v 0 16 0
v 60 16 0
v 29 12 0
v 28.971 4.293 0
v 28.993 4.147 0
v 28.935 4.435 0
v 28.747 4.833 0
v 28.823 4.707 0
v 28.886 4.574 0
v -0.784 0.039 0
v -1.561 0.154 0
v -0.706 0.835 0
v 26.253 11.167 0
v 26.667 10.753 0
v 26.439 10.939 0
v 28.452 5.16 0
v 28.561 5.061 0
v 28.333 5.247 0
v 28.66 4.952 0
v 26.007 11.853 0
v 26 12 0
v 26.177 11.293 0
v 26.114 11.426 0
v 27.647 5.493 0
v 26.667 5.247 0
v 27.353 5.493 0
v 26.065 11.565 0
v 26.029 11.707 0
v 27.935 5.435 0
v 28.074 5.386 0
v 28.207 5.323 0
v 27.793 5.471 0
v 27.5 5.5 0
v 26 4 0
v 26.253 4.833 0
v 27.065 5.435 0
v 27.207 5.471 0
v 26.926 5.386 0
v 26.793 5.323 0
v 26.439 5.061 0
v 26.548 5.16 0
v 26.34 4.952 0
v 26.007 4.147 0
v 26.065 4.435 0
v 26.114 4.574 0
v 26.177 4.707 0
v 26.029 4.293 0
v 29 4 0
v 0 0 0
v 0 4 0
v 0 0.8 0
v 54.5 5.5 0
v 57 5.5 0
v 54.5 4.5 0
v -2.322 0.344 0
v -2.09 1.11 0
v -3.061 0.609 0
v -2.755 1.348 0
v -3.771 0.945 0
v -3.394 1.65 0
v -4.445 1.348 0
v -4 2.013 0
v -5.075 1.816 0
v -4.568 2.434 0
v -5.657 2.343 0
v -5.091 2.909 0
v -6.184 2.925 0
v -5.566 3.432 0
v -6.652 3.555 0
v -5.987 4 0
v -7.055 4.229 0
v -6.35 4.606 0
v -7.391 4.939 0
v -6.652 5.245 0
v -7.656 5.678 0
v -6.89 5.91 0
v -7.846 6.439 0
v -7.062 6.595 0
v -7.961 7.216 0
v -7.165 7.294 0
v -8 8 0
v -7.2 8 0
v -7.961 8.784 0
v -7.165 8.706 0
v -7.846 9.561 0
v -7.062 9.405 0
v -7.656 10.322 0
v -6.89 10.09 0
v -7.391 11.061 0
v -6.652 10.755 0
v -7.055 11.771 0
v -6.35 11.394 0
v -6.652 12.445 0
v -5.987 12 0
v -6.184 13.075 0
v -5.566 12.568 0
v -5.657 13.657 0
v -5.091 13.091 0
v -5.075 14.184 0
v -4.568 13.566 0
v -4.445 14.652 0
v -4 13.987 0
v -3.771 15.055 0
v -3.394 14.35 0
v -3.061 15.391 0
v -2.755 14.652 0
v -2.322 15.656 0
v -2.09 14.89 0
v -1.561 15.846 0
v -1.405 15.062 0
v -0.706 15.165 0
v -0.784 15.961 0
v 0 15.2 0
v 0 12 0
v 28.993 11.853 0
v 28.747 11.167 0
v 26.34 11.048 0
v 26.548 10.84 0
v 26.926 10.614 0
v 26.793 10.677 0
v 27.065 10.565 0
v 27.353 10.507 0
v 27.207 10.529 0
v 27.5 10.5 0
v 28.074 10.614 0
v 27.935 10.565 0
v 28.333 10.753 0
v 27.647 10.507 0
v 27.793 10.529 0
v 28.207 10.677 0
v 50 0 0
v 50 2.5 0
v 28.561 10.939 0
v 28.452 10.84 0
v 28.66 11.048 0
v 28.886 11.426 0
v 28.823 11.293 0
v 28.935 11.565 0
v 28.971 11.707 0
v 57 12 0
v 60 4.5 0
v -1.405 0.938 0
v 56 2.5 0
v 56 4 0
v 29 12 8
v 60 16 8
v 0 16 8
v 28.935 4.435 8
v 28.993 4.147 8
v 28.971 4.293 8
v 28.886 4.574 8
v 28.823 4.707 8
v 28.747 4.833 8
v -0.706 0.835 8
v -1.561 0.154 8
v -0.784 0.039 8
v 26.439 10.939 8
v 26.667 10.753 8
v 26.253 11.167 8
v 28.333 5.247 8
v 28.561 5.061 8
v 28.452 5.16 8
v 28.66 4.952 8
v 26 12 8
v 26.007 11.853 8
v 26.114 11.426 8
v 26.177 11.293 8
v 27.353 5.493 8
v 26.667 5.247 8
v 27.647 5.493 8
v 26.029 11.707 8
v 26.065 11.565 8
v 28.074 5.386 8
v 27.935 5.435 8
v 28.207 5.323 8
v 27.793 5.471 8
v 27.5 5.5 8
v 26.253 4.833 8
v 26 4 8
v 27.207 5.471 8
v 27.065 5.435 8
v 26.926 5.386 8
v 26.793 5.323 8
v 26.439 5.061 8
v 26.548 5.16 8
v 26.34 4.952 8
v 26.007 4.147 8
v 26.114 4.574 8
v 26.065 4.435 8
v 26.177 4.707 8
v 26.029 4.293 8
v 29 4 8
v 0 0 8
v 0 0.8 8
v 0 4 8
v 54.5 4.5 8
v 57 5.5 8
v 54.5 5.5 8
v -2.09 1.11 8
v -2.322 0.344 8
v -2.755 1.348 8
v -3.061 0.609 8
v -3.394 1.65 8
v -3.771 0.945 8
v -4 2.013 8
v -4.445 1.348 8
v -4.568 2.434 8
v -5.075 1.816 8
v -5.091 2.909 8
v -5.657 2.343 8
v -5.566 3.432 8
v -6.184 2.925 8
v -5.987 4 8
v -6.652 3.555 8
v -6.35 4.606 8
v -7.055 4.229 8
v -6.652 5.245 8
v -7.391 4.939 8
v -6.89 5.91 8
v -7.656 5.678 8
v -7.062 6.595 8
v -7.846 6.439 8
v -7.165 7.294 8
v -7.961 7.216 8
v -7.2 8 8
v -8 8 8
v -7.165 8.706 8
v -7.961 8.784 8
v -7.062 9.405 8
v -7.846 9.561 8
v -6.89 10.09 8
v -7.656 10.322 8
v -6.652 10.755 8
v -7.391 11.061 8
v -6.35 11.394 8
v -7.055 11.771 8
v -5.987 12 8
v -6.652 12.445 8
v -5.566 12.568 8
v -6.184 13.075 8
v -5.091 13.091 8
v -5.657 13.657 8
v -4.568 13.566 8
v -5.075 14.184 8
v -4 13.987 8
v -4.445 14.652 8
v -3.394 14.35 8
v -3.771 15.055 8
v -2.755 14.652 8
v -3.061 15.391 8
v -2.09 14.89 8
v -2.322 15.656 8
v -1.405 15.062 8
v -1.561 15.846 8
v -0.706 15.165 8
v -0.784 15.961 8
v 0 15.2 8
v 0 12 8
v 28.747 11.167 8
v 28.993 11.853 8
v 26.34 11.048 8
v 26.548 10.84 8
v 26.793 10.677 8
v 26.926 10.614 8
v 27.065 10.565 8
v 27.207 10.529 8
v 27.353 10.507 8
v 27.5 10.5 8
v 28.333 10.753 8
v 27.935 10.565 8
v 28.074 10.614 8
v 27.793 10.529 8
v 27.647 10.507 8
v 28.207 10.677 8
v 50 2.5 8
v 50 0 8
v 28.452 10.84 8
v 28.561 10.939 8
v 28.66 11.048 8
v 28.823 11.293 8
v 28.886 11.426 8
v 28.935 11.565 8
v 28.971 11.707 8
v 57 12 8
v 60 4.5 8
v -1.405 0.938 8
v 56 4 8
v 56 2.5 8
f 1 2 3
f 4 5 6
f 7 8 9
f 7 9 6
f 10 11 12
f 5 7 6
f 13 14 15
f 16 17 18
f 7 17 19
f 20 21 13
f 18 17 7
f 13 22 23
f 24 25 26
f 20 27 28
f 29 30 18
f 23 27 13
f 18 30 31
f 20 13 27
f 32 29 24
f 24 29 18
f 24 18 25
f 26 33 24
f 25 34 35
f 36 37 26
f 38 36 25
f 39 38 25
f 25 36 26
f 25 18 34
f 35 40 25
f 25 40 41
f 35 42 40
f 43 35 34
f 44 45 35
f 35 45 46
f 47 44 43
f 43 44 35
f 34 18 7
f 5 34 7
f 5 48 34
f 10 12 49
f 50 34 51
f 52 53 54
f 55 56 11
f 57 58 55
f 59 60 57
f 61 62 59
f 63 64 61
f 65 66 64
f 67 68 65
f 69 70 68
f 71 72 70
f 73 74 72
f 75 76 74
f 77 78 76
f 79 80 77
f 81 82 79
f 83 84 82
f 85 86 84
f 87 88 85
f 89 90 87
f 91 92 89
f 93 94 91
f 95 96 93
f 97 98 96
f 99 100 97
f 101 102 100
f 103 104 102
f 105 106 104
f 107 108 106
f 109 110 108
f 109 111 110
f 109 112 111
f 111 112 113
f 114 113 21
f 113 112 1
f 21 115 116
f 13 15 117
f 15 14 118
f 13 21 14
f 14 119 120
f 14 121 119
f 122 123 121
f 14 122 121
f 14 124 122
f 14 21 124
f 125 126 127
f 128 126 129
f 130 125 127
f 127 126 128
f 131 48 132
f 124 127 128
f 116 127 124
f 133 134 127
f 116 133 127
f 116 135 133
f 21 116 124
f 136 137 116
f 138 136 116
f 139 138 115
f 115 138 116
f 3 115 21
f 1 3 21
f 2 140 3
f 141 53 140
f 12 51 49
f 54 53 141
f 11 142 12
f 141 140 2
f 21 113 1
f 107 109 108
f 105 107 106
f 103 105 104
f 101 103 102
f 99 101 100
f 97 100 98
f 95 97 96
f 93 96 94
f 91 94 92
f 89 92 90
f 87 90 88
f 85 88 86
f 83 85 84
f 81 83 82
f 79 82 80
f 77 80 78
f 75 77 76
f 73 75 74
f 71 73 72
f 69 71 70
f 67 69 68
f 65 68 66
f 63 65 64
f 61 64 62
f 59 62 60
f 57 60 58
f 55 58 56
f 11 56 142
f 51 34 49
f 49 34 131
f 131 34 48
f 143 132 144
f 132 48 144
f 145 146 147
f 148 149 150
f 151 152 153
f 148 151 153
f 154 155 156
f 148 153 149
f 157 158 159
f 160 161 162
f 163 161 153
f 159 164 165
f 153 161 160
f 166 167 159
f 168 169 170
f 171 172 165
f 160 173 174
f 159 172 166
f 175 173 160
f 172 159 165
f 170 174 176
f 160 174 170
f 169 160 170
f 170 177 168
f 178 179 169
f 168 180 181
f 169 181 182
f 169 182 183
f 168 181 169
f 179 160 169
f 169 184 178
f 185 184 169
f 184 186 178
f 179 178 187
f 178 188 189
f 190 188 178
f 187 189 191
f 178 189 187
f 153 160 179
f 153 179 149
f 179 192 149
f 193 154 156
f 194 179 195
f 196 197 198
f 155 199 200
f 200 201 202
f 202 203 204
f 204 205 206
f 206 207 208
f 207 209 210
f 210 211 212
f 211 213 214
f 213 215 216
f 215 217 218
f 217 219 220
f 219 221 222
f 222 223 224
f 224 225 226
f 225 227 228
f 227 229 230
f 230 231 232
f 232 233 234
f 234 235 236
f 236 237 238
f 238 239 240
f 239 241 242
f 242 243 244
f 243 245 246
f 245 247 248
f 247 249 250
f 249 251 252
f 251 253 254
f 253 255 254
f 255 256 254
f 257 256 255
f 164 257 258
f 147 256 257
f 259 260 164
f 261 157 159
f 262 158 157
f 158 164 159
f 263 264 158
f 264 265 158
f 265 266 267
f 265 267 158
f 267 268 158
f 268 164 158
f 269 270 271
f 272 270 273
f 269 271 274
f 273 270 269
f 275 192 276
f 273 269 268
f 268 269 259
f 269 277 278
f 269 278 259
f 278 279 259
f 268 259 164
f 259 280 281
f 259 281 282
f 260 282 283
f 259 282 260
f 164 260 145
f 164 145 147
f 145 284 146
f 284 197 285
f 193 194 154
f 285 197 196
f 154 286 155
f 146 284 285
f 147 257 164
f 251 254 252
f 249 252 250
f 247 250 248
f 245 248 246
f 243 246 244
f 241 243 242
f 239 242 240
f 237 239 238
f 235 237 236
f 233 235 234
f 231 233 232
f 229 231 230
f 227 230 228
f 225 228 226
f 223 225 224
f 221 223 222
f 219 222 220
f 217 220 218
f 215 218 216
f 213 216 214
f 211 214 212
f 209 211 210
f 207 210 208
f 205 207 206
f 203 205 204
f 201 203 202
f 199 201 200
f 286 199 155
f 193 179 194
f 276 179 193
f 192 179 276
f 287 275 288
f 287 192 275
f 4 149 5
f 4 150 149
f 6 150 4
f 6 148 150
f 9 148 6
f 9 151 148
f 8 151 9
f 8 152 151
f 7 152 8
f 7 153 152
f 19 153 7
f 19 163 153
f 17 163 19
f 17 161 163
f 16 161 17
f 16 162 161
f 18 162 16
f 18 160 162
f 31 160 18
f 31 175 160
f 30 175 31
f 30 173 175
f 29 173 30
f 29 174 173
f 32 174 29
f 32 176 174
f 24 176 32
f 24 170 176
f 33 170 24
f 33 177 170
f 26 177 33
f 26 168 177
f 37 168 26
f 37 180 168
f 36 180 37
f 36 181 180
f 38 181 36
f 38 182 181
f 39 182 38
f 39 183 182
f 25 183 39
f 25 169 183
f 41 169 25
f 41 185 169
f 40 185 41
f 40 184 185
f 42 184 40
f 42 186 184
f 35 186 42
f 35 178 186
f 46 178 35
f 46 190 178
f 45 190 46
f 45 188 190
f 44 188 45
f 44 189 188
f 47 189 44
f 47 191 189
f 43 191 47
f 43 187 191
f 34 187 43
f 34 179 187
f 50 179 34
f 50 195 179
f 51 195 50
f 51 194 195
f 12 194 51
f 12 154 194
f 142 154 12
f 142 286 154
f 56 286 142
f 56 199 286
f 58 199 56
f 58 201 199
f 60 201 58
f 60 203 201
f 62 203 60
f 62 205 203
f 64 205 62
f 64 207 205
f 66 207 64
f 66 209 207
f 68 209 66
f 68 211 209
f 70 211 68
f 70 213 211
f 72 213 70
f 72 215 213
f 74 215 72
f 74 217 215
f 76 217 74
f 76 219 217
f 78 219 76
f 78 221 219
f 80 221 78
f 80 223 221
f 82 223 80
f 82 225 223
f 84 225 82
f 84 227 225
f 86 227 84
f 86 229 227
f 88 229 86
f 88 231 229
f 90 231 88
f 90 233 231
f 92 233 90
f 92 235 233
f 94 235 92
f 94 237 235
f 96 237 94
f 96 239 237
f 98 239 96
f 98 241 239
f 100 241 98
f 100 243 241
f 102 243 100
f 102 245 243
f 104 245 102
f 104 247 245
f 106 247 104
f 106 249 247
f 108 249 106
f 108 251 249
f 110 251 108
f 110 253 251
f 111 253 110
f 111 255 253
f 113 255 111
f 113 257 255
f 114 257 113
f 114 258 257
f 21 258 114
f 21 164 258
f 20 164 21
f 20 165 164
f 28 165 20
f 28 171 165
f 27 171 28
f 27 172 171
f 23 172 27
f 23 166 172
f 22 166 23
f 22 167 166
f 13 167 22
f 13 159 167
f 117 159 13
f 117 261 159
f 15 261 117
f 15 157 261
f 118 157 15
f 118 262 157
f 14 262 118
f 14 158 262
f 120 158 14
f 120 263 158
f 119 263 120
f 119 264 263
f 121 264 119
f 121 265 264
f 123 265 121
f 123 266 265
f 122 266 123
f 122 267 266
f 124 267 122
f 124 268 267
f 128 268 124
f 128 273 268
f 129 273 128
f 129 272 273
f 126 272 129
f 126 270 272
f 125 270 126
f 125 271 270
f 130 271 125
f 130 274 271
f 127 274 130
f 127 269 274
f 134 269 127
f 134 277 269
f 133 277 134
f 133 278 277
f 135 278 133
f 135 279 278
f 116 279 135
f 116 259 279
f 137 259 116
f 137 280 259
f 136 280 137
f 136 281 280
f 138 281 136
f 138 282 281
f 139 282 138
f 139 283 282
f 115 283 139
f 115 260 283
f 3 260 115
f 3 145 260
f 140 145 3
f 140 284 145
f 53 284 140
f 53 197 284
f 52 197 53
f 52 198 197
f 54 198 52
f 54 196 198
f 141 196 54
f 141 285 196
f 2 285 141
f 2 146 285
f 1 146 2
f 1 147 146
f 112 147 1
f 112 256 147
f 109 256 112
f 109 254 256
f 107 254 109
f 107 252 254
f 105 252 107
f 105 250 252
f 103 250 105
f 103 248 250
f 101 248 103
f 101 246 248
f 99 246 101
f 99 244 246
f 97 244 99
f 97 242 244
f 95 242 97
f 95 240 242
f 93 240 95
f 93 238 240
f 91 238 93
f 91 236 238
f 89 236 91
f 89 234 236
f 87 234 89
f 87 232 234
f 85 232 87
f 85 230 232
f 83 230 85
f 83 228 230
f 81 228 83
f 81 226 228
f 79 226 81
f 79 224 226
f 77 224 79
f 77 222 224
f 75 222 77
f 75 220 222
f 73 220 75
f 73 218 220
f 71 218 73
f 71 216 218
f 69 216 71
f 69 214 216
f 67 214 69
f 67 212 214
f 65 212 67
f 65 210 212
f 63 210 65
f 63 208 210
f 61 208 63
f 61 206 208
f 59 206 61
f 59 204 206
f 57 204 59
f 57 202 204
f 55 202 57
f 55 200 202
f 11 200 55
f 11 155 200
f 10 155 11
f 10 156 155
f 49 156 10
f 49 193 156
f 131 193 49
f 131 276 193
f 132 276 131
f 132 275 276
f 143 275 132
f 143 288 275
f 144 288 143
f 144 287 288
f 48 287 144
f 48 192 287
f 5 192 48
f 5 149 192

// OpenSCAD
// Pinch clamp for silicone tubing - living hinge + snap latch
// 2-D profile in XY, extruded along Z. Coordinates as specified by user.

$fn = 64;

thk        = 8;      // extrusion depth along Z

// Lower jaw
low_len    = 50;     // lower bar length (x 0..50)
low_t      = 4;      // lower bar thickness (y 0..4)
tongue_x1  = 56;     // tongue end x
tongue_y0  = 2.5;    // tongue bottom y

// Upper jaw
up_len     = 60;     // upper bar length (x 0..60)
up_y0      = 12;     // upper bar bottom y
up_y1      = 16;     // upper bar top y

// Hinge half-ring
hinge_cy   = 8;      // hinge centre y (centre x = 0)
hinge_ro   = 8;      // outer radius
hinge_ri   = 7.2;    // inner radius (0.8 mm wall)
hinge_ov   = 0.5;    // overlap into jaws for a clean union

// Pinch ridges
ridge_x    = 27.5;   // ridge x position
ridge_r    = 1.5;    // ridge radius
ridge_y_lo = 4;       // lower ridge centre y
ridge_y_up = 12;      // upper ridge centre y

// Latch
leg_x0     = 57;     // leg left x
leg_x1     = 60;     // leg right x
leg_y0     = 4.5;    // leg bottom y
nose_x0    = 54.5;   // nose left x
nose_y1    = 5.5;    // nose top y

module profile() {
    union() {
        // lower jaw bar
        translate([0, 0]) square([low_len, low_t]);
        // tongue
        translate([low_len - 0.01, tongue_y0])
            square([tongue_x1 - low_len + 0.01, low_t - tongue_y0]);
        // upper jaw bar
        translate([0, up_y0]) square([up_len, up_y1 - up_y0]);
        // hinge half-ring (x < 0 side)
        intersection() {
            difference() {
                translate([0, hinge_cy]) circle(r = hinge_ro);
                translate([0, hinge_cy]) circle(r = hinge_ri);
            }
            translate([-hinge_ro - 1, 0])
                square([hinge_ro + 1 + hinge_ov, up_y1]);
        }
        // pinch ridges
        translate([ridge_x, ridge_y_lo]) circle(r = ridge_r);
        translate([ridge_x, ridge_y_up]) circle(r = ridge_r);
        // latch leg (overlaps upper jaw)
        translate([leg_x0, leg_y0])
            square([leg_x1 - leg_x0, up_y0 - leg_y0 + 0.5]);
        // latch nose
        translate([nose_x0, leg_y0])
            square([leg_x0 - nose_x0 + 0.01, nose_y1 - leg_y0]);
    }
}

linear_extrude(height = thk) profile();
